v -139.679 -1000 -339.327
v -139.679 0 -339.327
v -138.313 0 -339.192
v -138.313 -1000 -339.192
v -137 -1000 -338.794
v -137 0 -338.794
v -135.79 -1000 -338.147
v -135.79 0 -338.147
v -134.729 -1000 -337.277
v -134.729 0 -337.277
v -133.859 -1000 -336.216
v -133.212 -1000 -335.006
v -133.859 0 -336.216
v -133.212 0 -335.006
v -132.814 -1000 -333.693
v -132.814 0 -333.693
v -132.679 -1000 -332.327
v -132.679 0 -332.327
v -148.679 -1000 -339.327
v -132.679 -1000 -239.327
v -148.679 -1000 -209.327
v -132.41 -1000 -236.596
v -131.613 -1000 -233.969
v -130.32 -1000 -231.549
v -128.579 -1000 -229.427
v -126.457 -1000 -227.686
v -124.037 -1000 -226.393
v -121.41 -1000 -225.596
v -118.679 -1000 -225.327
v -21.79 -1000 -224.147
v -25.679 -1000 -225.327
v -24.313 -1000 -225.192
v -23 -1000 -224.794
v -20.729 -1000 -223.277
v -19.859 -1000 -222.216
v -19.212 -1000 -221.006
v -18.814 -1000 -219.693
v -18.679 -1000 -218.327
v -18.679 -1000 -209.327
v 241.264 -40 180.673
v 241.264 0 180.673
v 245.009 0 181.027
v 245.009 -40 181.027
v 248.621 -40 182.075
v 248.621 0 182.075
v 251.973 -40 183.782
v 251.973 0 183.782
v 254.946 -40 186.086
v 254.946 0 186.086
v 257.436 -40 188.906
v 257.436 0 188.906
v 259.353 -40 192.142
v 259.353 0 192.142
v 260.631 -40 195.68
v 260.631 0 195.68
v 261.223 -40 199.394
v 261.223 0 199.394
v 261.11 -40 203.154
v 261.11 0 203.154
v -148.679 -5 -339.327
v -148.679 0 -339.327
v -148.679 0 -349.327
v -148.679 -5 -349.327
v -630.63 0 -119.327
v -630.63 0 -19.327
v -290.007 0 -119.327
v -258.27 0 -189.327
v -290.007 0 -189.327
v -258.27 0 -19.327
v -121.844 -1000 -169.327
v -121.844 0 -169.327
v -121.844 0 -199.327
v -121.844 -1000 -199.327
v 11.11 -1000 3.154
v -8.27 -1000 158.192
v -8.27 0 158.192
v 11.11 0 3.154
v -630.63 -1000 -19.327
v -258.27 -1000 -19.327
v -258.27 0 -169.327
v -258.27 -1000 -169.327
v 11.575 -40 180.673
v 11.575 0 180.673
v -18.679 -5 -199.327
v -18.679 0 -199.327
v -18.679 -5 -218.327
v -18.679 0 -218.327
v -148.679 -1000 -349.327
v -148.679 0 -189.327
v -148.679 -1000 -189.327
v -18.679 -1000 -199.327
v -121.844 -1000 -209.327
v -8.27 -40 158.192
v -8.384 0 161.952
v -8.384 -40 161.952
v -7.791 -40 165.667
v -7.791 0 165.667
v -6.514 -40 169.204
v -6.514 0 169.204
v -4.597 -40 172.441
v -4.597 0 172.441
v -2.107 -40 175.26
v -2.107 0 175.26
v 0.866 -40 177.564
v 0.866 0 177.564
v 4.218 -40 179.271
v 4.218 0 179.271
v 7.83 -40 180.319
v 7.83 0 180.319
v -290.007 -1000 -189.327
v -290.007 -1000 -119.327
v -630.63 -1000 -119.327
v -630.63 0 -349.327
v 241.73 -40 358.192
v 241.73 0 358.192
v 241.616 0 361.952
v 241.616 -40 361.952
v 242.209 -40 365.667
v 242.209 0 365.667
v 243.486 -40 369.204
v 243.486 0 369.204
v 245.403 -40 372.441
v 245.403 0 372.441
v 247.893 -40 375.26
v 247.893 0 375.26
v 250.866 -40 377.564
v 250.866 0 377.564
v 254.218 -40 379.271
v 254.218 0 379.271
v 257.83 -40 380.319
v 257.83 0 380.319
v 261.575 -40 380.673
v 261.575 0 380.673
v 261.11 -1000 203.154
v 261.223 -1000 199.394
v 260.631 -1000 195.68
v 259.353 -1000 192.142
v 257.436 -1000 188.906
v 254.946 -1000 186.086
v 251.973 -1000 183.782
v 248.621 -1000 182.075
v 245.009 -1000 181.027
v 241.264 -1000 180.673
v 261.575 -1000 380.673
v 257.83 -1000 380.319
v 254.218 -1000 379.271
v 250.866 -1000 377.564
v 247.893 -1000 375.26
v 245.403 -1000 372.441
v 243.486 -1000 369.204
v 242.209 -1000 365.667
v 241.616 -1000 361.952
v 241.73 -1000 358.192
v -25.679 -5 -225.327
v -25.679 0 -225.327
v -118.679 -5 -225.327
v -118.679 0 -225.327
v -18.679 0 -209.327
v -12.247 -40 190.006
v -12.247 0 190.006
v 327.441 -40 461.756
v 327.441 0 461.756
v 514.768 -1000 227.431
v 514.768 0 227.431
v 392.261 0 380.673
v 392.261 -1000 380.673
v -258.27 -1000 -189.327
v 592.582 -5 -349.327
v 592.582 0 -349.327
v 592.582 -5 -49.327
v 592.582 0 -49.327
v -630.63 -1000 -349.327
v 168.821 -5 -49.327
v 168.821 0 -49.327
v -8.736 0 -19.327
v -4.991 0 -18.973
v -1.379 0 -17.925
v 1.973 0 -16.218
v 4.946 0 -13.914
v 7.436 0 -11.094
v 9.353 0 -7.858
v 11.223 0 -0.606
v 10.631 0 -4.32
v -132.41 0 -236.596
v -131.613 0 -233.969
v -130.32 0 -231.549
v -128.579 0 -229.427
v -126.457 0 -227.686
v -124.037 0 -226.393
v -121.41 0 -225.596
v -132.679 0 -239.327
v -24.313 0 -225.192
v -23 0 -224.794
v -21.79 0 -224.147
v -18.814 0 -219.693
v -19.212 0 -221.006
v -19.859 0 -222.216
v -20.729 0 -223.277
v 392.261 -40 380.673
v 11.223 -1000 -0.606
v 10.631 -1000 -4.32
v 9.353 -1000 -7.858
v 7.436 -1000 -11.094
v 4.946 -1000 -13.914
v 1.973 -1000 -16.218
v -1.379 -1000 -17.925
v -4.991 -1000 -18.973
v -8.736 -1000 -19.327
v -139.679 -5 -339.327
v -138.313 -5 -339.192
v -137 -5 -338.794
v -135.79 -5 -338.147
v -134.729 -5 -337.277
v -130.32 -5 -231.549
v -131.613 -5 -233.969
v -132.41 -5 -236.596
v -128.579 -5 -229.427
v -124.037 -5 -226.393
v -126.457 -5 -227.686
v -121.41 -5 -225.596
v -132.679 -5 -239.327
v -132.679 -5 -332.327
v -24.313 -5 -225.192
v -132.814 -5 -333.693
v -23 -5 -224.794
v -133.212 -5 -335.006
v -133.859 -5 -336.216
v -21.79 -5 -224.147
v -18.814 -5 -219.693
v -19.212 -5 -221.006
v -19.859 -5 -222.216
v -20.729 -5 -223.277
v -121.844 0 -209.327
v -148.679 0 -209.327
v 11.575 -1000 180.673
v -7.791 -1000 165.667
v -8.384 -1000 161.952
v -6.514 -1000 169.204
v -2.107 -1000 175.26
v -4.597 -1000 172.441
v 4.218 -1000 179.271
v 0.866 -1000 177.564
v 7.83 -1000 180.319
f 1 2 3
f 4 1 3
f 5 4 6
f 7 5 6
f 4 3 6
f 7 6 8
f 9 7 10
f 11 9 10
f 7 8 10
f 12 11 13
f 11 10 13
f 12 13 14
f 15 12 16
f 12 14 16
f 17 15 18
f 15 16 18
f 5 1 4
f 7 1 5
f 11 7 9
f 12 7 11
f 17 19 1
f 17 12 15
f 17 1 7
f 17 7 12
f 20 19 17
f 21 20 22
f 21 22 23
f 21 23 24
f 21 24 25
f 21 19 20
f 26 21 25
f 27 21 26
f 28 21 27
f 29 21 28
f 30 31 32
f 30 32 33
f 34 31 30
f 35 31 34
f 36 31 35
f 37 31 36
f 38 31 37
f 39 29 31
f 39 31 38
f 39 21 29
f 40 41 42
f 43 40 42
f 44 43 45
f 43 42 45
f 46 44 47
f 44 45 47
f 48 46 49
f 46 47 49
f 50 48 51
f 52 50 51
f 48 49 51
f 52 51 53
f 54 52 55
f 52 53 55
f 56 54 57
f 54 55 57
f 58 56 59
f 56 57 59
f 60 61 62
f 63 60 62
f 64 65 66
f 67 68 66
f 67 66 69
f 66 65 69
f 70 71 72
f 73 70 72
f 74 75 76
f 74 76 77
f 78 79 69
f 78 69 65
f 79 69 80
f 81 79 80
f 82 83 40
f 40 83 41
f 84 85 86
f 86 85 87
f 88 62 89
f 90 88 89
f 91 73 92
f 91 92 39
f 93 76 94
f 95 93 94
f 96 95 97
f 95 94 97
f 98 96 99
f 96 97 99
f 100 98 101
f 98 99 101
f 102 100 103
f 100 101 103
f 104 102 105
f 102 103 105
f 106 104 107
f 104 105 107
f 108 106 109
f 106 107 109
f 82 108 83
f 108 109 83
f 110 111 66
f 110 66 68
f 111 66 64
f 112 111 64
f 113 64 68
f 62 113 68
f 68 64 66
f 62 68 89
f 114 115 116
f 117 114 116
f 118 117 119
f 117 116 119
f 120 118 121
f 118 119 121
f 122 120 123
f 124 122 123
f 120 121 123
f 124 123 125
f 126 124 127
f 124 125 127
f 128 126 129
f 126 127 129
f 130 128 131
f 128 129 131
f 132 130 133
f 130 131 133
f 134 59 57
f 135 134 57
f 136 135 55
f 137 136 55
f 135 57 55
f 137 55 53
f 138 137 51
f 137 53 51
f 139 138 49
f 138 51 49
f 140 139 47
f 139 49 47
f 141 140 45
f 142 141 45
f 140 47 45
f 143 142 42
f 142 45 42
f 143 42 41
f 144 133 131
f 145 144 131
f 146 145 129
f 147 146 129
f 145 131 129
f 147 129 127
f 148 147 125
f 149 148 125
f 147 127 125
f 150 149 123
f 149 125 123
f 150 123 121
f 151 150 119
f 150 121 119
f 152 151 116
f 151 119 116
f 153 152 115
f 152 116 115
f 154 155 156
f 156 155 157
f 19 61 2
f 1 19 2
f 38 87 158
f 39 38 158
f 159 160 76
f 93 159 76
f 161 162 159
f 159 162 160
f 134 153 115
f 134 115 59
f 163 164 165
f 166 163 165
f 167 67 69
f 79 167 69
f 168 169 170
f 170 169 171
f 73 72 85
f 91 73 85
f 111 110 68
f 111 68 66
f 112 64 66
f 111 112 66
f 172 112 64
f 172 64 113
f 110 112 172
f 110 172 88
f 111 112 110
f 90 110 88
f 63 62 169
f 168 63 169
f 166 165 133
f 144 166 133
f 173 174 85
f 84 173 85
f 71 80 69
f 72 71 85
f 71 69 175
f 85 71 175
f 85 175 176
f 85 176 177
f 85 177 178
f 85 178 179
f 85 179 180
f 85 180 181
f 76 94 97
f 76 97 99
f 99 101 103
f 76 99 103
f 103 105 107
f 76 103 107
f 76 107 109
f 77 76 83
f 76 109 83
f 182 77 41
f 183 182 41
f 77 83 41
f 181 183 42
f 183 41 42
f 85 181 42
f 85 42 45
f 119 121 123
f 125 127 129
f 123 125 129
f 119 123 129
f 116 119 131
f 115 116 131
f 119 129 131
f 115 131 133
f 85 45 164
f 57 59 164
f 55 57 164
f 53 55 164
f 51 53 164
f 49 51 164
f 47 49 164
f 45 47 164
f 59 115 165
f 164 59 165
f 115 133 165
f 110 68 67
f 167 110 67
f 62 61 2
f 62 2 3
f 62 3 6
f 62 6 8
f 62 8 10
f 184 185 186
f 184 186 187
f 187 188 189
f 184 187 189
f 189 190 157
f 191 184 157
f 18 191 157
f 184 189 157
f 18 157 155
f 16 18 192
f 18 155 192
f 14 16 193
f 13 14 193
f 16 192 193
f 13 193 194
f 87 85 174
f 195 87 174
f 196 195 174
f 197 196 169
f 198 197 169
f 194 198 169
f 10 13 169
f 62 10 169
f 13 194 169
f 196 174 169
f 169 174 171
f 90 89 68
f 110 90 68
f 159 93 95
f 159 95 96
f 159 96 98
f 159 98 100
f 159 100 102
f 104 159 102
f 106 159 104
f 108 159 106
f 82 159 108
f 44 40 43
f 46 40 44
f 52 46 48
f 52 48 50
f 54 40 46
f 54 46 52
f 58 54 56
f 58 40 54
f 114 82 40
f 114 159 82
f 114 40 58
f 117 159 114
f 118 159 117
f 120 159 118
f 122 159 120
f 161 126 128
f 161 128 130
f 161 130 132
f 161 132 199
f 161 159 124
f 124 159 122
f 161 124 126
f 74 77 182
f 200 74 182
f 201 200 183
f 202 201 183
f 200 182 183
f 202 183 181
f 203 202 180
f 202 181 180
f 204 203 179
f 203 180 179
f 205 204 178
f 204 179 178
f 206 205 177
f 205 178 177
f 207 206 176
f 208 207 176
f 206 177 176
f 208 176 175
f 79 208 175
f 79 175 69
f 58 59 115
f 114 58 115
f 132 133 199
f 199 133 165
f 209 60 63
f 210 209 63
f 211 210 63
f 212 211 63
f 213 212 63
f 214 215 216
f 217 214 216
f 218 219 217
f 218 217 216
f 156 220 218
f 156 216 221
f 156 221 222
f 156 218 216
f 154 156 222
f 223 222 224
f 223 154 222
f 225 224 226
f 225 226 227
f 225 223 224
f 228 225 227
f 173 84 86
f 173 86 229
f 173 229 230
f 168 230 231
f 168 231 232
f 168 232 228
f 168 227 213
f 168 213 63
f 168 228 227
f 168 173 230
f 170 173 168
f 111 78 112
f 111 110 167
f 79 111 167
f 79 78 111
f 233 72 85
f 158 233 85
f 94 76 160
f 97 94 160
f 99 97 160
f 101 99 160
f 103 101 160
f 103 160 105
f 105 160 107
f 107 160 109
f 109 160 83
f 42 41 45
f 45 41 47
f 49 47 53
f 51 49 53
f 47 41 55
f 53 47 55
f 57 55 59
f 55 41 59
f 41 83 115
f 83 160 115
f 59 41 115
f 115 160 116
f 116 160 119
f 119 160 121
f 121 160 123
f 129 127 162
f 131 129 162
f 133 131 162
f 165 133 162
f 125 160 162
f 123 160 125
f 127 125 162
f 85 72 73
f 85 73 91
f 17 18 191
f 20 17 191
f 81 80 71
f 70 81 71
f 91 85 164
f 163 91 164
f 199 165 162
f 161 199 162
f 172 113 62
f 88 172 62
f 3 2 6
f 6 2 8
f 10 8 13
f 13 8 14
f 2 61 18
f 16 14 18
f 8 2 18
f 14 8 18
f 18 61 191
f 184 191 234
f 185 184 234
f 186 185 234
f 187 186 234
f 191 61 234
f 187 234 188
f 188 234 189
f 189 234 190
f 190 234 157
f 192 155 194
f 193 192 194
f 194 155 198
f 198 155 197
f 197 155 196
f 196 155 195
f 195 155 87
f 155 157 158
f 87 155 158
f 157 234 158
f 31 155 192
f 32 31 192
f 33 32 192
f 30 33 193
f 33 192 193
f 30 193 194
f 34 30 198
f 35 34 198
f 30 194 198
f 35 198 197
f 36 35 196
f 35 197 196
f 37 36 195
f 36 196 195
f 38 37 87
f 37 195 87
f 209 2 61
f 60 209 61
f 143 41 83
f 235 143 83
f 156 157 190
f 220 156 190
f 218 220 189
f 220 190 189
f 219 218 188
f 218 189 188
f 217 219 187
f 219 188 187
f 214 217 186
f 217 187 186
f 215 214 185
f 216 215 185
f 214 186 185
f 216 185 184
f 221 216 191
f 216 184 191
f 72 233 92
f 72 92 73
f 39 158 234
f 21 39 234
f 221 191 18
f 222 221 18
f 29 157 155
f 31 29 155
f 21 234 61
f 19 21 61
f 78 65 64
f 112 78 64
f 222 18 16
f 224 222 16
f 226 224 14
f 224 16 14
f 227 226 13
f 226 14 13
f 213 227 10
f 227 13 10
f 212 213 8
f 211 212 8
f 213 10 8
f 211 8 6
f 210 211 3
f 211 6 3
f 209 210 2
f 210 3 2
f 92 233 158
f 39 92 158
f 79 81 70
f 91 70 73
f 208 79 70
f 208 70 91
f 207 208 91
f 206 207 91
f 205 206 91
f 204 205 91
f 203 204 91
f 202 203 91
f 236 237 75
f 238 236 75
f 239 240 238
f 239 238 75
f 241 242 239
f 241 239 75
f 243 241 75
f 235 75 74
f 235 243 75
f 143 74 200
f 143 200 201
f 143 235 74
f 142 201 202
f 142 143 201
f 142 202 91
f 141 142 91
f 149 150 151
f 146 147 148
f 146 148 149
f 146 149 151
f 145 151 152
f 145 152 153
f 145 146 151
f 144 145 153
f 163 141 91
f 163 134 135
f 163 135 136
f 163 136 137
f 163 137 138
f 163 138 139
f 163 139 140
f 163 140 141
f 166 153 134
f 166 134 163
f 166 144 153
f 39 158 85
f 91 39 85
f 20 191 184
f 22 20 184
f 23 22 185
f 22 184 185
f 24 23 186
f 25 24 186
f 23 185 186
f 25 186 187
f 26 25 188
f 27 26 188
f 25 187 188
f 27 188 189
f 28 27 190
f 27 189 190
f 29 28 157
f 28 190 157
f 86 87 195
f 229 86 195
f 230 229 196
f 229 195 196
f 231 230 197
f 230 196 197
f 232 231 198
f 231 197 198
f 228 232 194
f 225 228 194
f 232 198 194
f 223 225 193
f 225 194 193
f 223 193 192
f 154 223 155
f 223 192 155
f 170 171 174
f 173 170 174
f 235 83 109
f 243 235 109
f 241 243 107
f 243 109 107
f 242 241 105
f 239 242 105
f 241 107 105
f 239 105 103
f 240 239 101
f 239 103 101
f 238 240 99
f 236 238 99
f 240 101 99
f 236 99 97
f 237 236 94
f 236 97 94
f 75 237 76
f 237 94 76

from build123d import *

# Parameters (mm, degrees)
F1_DEPTH = 1000
F2_DEPTH = 1000
F3_DEPTH = 1000
F4_DEPTH = 40
F5_DEPTH = 1000
F0_W     = 103.16486
F0_H     = 10
F6_DEPTH = 1000
F7_DEPTH = 5


# Not quite as in the source:
# - ends of sketch curves that miss each other by under 0.0002 mm in the source are joined


with BuildPart() as f1:
    # F0 (on Front) → F1 (new body)
    with BuildSketch(Plane.XZ):
        Polygon((-148.679091, -189.326917), (-258.2703, -189.326917), (-290.006736, -189.326917), (-290.006736, -119.326917), (-630.630191, -119.326917), (-630.630191, -299.326917), (-148.679091, -299.326917), (-148.679091, -209.326917), align=None)
        Polygon((-148.679091, -299.326917), (-630.630191, -299.326917), (-630.630191, -349.326917), (-148.679091, -349.326917), (-148.679091, -339.326917), align=None)
    extrude(amount=F1_DEPTH)


with BuildPart() as f2:
    # F0 (on Front) → F2 (new body)
    with BuildSketch(Plane.XZ):
        Polygon((-258.2703, -169.326917), (-258.2703, -19.326917), (-630.630191, -19.326917), (-630.630191, -119.326917), (-290.006736, -119.326917), (-290.006736, -189.326917), (-258.2703, -189.326917), align=None)
    extrude(amount=F2_DEPTH)


with BuildPart() as f3:
    # F0 (on Front) → F3 (new body)
    with BuildSketch(Plane.XZ):
        with BuildLine():
            Line((-8.736031, -19.326917), (-258.2703, -19.326917))
            Line((-258.2703, -19.326917), (-258.2703, -169.326917))
            Line((-258.2703, -169.326917), (-148.679091, -169.326917))
            Line((-148.679091, -169.326917), (-121.843951, -169.326917))
            Line((-121.843951, -169.326917), (-121.843951, -199.326917))
            Line((-121.843951, -199.326917), (-18.679091, -199.326917))
            Line((-18.679091, -199.326917), (168.8209090686, -49.3269170857))
            Line((168.8209090686, -49.3269170857), (514.767742, 227.430549))
            Line((514.767742, 227.430549), (392.2610169622, 380.6730829698))
            Line((392.2610169622, 380.6730829698), (261.575257, 380.673083))
            ThreePointArc((261.575257, 380.673083), (246.5816933606, 373.9091341252), (241.7296995119, 358.192387939))
            Line((241.7296995119, 358.192387939), (261.109526, 203.153777))
            ThreePointArc((261.109526, 203.153777), (256.2575323111, 187.4370315028), (241.263969, 180.673083))
            Line((241.263969, 180.673083), (11.575257, 180.673083))
            ThreePointArc((11.575257, 180.673083), (-3.4183066394, 173.9091341252), (-8.2703004881, 158.192387939))
            Line((-8.2703004881, 158.192387939), (11.109526, 3.153777))
            ThreePointArc((11.109526, 3.153777), (6.2575323111, -12.5629684972), (-8.736031, -19.326917))
        make_face()
    extrude(amount=F3_DEPTH)


with BuildPart() as f4:
    # F0 (on Front) → F4 (new body)
    with BuildSketch(Plane.XZ):
        with BuildLine():
            Line((-12.247023, 190.006168), (-8.2703004714, 158.1923879411))
            ThreePointArc((-8.2703004714, 158.1923879411), (-3.4183066394, 173.9091341252), (11.575257, 180.673083))
            Line((11.575257, 180.673083), (241.263969, 180.673083))
            ThreePointArc((241.263969, 180.673083), (256.2575323111, 187.4370315028), (261.1095266112, 203.1537770764))
            Line((261.1095266112, 203.1537770764), (241.7297, 358.192388))
            ThreePointArc((241.7297, 358.192388), (246.5816933606, 373.9091341252), (261.575257, 380.673083))
            Line((261.575257, 380.673083), (392.261017, 380.673083))
            Line((392.261017, 380.673083), (327.4406389587, 461.756296967))
            Line((327.4406389587, 461.756296967), (-12.247023, 190.006168))
        make_face()
    extrude(amount=F4_DEPTH)


with BuildPart() as f5:
    # F0 (on Front) → F5 (new body)
    with BuildSketch(Plane.XZ):
        with BuildLine():
            Line((-121.843951, -209.326917), (-148.679091, -209.326917))
            Line((-148.679091, -209.326917), (-148.679091, -299.326917))
            Line((-148.679091, -299.326917), (-148.679091, -339.326917))
            Line((-148.679091, -339.326917), (-139.679091, -339.326917))
            ThreePointArc((-139.679091, -339.326917), (-134.7293435317, -337.2766644683), (-132.679091, -332.326917))
            Line((-132.679091, -332.326917), (-132.679091, -239.326917))
            ThreePointArc((-132.679091, -239.326917), (-128.5785859366, -229.4274220634), (-118.679091, -225.326917))
            Line((-118.679091, -225.326917), (-25.679091, -225.326917))
            ThreePointArc((-25.679091, -225.326917), (-20.7293435317, -223.2766644683), (-18.679091, -218.326917))
            Line((-18.679091, -218.326917), (-18.679091, -209.326917))
            Line((-18.679091, -209.326917), (-121.843951, -209.326917))
        make_face()
    extrude(amount=F5_DEPTH)


with BuildPart() as f6:
    # F0 (on Front) → F6 (new body)
    with BuildSketch(Plane.XZ):
        with Locations((-70.261521, -204.326917)):
            Rectangle(F0_W, F0_H)
    extrude(amount=F6_DEPTH)


with BuildPart() as f7:
    # F0 (on Front) → F7 (new body)
    with BuildSketch(Plane.XZ):
        with BuildLine():
            Line((168.8209090686, -49.3269170857), (-18.679091, -199.326917))
            Line((-18.679091, -199.326917), (-18.679091, -209.326917))
            Line((-18.679091, -209.326917), (-18.679091, -218.326917))
            ThreePointArc((-18.679091, -218.326917), (-20.7293435317, -223.2766644683), (-25.679091, -225.326917))
            Line((-25.679091, -225.326917), (-118.679091, -225.326917))
            ThreePointArc((-118.679091, -225.326917), (-128.5785859366, -229.4274220634), (-132.679091, -239.326917))
            Line((-132.679091, -239.326917), (-132.679091, -332.326917))
            ThreePointArc((-132.679091, -332.326917), (-134.7293435317, -337.2766644683), (-139.679091, -339.326917))
            Line((-139.679091, -339.326917), (-148.679091, -339.326917))
            Line((-148.679091, -339.326917), (-148.679091, -349.326917))
            Line((-148.679091, -349.326917), (592.581942, -349.326917))
            Line((592.581942, -349.326917), (592.581942, -49.326917))
            Line((592.581942, -49.326917), (168.8209090686, -49.3269170857))
        make_face()
    extrude(amount=F7_DEPTH)


solid = Compound([f1.part, f2.part, f3.part, f4.part, f5.part, f6.part, f7.part])
